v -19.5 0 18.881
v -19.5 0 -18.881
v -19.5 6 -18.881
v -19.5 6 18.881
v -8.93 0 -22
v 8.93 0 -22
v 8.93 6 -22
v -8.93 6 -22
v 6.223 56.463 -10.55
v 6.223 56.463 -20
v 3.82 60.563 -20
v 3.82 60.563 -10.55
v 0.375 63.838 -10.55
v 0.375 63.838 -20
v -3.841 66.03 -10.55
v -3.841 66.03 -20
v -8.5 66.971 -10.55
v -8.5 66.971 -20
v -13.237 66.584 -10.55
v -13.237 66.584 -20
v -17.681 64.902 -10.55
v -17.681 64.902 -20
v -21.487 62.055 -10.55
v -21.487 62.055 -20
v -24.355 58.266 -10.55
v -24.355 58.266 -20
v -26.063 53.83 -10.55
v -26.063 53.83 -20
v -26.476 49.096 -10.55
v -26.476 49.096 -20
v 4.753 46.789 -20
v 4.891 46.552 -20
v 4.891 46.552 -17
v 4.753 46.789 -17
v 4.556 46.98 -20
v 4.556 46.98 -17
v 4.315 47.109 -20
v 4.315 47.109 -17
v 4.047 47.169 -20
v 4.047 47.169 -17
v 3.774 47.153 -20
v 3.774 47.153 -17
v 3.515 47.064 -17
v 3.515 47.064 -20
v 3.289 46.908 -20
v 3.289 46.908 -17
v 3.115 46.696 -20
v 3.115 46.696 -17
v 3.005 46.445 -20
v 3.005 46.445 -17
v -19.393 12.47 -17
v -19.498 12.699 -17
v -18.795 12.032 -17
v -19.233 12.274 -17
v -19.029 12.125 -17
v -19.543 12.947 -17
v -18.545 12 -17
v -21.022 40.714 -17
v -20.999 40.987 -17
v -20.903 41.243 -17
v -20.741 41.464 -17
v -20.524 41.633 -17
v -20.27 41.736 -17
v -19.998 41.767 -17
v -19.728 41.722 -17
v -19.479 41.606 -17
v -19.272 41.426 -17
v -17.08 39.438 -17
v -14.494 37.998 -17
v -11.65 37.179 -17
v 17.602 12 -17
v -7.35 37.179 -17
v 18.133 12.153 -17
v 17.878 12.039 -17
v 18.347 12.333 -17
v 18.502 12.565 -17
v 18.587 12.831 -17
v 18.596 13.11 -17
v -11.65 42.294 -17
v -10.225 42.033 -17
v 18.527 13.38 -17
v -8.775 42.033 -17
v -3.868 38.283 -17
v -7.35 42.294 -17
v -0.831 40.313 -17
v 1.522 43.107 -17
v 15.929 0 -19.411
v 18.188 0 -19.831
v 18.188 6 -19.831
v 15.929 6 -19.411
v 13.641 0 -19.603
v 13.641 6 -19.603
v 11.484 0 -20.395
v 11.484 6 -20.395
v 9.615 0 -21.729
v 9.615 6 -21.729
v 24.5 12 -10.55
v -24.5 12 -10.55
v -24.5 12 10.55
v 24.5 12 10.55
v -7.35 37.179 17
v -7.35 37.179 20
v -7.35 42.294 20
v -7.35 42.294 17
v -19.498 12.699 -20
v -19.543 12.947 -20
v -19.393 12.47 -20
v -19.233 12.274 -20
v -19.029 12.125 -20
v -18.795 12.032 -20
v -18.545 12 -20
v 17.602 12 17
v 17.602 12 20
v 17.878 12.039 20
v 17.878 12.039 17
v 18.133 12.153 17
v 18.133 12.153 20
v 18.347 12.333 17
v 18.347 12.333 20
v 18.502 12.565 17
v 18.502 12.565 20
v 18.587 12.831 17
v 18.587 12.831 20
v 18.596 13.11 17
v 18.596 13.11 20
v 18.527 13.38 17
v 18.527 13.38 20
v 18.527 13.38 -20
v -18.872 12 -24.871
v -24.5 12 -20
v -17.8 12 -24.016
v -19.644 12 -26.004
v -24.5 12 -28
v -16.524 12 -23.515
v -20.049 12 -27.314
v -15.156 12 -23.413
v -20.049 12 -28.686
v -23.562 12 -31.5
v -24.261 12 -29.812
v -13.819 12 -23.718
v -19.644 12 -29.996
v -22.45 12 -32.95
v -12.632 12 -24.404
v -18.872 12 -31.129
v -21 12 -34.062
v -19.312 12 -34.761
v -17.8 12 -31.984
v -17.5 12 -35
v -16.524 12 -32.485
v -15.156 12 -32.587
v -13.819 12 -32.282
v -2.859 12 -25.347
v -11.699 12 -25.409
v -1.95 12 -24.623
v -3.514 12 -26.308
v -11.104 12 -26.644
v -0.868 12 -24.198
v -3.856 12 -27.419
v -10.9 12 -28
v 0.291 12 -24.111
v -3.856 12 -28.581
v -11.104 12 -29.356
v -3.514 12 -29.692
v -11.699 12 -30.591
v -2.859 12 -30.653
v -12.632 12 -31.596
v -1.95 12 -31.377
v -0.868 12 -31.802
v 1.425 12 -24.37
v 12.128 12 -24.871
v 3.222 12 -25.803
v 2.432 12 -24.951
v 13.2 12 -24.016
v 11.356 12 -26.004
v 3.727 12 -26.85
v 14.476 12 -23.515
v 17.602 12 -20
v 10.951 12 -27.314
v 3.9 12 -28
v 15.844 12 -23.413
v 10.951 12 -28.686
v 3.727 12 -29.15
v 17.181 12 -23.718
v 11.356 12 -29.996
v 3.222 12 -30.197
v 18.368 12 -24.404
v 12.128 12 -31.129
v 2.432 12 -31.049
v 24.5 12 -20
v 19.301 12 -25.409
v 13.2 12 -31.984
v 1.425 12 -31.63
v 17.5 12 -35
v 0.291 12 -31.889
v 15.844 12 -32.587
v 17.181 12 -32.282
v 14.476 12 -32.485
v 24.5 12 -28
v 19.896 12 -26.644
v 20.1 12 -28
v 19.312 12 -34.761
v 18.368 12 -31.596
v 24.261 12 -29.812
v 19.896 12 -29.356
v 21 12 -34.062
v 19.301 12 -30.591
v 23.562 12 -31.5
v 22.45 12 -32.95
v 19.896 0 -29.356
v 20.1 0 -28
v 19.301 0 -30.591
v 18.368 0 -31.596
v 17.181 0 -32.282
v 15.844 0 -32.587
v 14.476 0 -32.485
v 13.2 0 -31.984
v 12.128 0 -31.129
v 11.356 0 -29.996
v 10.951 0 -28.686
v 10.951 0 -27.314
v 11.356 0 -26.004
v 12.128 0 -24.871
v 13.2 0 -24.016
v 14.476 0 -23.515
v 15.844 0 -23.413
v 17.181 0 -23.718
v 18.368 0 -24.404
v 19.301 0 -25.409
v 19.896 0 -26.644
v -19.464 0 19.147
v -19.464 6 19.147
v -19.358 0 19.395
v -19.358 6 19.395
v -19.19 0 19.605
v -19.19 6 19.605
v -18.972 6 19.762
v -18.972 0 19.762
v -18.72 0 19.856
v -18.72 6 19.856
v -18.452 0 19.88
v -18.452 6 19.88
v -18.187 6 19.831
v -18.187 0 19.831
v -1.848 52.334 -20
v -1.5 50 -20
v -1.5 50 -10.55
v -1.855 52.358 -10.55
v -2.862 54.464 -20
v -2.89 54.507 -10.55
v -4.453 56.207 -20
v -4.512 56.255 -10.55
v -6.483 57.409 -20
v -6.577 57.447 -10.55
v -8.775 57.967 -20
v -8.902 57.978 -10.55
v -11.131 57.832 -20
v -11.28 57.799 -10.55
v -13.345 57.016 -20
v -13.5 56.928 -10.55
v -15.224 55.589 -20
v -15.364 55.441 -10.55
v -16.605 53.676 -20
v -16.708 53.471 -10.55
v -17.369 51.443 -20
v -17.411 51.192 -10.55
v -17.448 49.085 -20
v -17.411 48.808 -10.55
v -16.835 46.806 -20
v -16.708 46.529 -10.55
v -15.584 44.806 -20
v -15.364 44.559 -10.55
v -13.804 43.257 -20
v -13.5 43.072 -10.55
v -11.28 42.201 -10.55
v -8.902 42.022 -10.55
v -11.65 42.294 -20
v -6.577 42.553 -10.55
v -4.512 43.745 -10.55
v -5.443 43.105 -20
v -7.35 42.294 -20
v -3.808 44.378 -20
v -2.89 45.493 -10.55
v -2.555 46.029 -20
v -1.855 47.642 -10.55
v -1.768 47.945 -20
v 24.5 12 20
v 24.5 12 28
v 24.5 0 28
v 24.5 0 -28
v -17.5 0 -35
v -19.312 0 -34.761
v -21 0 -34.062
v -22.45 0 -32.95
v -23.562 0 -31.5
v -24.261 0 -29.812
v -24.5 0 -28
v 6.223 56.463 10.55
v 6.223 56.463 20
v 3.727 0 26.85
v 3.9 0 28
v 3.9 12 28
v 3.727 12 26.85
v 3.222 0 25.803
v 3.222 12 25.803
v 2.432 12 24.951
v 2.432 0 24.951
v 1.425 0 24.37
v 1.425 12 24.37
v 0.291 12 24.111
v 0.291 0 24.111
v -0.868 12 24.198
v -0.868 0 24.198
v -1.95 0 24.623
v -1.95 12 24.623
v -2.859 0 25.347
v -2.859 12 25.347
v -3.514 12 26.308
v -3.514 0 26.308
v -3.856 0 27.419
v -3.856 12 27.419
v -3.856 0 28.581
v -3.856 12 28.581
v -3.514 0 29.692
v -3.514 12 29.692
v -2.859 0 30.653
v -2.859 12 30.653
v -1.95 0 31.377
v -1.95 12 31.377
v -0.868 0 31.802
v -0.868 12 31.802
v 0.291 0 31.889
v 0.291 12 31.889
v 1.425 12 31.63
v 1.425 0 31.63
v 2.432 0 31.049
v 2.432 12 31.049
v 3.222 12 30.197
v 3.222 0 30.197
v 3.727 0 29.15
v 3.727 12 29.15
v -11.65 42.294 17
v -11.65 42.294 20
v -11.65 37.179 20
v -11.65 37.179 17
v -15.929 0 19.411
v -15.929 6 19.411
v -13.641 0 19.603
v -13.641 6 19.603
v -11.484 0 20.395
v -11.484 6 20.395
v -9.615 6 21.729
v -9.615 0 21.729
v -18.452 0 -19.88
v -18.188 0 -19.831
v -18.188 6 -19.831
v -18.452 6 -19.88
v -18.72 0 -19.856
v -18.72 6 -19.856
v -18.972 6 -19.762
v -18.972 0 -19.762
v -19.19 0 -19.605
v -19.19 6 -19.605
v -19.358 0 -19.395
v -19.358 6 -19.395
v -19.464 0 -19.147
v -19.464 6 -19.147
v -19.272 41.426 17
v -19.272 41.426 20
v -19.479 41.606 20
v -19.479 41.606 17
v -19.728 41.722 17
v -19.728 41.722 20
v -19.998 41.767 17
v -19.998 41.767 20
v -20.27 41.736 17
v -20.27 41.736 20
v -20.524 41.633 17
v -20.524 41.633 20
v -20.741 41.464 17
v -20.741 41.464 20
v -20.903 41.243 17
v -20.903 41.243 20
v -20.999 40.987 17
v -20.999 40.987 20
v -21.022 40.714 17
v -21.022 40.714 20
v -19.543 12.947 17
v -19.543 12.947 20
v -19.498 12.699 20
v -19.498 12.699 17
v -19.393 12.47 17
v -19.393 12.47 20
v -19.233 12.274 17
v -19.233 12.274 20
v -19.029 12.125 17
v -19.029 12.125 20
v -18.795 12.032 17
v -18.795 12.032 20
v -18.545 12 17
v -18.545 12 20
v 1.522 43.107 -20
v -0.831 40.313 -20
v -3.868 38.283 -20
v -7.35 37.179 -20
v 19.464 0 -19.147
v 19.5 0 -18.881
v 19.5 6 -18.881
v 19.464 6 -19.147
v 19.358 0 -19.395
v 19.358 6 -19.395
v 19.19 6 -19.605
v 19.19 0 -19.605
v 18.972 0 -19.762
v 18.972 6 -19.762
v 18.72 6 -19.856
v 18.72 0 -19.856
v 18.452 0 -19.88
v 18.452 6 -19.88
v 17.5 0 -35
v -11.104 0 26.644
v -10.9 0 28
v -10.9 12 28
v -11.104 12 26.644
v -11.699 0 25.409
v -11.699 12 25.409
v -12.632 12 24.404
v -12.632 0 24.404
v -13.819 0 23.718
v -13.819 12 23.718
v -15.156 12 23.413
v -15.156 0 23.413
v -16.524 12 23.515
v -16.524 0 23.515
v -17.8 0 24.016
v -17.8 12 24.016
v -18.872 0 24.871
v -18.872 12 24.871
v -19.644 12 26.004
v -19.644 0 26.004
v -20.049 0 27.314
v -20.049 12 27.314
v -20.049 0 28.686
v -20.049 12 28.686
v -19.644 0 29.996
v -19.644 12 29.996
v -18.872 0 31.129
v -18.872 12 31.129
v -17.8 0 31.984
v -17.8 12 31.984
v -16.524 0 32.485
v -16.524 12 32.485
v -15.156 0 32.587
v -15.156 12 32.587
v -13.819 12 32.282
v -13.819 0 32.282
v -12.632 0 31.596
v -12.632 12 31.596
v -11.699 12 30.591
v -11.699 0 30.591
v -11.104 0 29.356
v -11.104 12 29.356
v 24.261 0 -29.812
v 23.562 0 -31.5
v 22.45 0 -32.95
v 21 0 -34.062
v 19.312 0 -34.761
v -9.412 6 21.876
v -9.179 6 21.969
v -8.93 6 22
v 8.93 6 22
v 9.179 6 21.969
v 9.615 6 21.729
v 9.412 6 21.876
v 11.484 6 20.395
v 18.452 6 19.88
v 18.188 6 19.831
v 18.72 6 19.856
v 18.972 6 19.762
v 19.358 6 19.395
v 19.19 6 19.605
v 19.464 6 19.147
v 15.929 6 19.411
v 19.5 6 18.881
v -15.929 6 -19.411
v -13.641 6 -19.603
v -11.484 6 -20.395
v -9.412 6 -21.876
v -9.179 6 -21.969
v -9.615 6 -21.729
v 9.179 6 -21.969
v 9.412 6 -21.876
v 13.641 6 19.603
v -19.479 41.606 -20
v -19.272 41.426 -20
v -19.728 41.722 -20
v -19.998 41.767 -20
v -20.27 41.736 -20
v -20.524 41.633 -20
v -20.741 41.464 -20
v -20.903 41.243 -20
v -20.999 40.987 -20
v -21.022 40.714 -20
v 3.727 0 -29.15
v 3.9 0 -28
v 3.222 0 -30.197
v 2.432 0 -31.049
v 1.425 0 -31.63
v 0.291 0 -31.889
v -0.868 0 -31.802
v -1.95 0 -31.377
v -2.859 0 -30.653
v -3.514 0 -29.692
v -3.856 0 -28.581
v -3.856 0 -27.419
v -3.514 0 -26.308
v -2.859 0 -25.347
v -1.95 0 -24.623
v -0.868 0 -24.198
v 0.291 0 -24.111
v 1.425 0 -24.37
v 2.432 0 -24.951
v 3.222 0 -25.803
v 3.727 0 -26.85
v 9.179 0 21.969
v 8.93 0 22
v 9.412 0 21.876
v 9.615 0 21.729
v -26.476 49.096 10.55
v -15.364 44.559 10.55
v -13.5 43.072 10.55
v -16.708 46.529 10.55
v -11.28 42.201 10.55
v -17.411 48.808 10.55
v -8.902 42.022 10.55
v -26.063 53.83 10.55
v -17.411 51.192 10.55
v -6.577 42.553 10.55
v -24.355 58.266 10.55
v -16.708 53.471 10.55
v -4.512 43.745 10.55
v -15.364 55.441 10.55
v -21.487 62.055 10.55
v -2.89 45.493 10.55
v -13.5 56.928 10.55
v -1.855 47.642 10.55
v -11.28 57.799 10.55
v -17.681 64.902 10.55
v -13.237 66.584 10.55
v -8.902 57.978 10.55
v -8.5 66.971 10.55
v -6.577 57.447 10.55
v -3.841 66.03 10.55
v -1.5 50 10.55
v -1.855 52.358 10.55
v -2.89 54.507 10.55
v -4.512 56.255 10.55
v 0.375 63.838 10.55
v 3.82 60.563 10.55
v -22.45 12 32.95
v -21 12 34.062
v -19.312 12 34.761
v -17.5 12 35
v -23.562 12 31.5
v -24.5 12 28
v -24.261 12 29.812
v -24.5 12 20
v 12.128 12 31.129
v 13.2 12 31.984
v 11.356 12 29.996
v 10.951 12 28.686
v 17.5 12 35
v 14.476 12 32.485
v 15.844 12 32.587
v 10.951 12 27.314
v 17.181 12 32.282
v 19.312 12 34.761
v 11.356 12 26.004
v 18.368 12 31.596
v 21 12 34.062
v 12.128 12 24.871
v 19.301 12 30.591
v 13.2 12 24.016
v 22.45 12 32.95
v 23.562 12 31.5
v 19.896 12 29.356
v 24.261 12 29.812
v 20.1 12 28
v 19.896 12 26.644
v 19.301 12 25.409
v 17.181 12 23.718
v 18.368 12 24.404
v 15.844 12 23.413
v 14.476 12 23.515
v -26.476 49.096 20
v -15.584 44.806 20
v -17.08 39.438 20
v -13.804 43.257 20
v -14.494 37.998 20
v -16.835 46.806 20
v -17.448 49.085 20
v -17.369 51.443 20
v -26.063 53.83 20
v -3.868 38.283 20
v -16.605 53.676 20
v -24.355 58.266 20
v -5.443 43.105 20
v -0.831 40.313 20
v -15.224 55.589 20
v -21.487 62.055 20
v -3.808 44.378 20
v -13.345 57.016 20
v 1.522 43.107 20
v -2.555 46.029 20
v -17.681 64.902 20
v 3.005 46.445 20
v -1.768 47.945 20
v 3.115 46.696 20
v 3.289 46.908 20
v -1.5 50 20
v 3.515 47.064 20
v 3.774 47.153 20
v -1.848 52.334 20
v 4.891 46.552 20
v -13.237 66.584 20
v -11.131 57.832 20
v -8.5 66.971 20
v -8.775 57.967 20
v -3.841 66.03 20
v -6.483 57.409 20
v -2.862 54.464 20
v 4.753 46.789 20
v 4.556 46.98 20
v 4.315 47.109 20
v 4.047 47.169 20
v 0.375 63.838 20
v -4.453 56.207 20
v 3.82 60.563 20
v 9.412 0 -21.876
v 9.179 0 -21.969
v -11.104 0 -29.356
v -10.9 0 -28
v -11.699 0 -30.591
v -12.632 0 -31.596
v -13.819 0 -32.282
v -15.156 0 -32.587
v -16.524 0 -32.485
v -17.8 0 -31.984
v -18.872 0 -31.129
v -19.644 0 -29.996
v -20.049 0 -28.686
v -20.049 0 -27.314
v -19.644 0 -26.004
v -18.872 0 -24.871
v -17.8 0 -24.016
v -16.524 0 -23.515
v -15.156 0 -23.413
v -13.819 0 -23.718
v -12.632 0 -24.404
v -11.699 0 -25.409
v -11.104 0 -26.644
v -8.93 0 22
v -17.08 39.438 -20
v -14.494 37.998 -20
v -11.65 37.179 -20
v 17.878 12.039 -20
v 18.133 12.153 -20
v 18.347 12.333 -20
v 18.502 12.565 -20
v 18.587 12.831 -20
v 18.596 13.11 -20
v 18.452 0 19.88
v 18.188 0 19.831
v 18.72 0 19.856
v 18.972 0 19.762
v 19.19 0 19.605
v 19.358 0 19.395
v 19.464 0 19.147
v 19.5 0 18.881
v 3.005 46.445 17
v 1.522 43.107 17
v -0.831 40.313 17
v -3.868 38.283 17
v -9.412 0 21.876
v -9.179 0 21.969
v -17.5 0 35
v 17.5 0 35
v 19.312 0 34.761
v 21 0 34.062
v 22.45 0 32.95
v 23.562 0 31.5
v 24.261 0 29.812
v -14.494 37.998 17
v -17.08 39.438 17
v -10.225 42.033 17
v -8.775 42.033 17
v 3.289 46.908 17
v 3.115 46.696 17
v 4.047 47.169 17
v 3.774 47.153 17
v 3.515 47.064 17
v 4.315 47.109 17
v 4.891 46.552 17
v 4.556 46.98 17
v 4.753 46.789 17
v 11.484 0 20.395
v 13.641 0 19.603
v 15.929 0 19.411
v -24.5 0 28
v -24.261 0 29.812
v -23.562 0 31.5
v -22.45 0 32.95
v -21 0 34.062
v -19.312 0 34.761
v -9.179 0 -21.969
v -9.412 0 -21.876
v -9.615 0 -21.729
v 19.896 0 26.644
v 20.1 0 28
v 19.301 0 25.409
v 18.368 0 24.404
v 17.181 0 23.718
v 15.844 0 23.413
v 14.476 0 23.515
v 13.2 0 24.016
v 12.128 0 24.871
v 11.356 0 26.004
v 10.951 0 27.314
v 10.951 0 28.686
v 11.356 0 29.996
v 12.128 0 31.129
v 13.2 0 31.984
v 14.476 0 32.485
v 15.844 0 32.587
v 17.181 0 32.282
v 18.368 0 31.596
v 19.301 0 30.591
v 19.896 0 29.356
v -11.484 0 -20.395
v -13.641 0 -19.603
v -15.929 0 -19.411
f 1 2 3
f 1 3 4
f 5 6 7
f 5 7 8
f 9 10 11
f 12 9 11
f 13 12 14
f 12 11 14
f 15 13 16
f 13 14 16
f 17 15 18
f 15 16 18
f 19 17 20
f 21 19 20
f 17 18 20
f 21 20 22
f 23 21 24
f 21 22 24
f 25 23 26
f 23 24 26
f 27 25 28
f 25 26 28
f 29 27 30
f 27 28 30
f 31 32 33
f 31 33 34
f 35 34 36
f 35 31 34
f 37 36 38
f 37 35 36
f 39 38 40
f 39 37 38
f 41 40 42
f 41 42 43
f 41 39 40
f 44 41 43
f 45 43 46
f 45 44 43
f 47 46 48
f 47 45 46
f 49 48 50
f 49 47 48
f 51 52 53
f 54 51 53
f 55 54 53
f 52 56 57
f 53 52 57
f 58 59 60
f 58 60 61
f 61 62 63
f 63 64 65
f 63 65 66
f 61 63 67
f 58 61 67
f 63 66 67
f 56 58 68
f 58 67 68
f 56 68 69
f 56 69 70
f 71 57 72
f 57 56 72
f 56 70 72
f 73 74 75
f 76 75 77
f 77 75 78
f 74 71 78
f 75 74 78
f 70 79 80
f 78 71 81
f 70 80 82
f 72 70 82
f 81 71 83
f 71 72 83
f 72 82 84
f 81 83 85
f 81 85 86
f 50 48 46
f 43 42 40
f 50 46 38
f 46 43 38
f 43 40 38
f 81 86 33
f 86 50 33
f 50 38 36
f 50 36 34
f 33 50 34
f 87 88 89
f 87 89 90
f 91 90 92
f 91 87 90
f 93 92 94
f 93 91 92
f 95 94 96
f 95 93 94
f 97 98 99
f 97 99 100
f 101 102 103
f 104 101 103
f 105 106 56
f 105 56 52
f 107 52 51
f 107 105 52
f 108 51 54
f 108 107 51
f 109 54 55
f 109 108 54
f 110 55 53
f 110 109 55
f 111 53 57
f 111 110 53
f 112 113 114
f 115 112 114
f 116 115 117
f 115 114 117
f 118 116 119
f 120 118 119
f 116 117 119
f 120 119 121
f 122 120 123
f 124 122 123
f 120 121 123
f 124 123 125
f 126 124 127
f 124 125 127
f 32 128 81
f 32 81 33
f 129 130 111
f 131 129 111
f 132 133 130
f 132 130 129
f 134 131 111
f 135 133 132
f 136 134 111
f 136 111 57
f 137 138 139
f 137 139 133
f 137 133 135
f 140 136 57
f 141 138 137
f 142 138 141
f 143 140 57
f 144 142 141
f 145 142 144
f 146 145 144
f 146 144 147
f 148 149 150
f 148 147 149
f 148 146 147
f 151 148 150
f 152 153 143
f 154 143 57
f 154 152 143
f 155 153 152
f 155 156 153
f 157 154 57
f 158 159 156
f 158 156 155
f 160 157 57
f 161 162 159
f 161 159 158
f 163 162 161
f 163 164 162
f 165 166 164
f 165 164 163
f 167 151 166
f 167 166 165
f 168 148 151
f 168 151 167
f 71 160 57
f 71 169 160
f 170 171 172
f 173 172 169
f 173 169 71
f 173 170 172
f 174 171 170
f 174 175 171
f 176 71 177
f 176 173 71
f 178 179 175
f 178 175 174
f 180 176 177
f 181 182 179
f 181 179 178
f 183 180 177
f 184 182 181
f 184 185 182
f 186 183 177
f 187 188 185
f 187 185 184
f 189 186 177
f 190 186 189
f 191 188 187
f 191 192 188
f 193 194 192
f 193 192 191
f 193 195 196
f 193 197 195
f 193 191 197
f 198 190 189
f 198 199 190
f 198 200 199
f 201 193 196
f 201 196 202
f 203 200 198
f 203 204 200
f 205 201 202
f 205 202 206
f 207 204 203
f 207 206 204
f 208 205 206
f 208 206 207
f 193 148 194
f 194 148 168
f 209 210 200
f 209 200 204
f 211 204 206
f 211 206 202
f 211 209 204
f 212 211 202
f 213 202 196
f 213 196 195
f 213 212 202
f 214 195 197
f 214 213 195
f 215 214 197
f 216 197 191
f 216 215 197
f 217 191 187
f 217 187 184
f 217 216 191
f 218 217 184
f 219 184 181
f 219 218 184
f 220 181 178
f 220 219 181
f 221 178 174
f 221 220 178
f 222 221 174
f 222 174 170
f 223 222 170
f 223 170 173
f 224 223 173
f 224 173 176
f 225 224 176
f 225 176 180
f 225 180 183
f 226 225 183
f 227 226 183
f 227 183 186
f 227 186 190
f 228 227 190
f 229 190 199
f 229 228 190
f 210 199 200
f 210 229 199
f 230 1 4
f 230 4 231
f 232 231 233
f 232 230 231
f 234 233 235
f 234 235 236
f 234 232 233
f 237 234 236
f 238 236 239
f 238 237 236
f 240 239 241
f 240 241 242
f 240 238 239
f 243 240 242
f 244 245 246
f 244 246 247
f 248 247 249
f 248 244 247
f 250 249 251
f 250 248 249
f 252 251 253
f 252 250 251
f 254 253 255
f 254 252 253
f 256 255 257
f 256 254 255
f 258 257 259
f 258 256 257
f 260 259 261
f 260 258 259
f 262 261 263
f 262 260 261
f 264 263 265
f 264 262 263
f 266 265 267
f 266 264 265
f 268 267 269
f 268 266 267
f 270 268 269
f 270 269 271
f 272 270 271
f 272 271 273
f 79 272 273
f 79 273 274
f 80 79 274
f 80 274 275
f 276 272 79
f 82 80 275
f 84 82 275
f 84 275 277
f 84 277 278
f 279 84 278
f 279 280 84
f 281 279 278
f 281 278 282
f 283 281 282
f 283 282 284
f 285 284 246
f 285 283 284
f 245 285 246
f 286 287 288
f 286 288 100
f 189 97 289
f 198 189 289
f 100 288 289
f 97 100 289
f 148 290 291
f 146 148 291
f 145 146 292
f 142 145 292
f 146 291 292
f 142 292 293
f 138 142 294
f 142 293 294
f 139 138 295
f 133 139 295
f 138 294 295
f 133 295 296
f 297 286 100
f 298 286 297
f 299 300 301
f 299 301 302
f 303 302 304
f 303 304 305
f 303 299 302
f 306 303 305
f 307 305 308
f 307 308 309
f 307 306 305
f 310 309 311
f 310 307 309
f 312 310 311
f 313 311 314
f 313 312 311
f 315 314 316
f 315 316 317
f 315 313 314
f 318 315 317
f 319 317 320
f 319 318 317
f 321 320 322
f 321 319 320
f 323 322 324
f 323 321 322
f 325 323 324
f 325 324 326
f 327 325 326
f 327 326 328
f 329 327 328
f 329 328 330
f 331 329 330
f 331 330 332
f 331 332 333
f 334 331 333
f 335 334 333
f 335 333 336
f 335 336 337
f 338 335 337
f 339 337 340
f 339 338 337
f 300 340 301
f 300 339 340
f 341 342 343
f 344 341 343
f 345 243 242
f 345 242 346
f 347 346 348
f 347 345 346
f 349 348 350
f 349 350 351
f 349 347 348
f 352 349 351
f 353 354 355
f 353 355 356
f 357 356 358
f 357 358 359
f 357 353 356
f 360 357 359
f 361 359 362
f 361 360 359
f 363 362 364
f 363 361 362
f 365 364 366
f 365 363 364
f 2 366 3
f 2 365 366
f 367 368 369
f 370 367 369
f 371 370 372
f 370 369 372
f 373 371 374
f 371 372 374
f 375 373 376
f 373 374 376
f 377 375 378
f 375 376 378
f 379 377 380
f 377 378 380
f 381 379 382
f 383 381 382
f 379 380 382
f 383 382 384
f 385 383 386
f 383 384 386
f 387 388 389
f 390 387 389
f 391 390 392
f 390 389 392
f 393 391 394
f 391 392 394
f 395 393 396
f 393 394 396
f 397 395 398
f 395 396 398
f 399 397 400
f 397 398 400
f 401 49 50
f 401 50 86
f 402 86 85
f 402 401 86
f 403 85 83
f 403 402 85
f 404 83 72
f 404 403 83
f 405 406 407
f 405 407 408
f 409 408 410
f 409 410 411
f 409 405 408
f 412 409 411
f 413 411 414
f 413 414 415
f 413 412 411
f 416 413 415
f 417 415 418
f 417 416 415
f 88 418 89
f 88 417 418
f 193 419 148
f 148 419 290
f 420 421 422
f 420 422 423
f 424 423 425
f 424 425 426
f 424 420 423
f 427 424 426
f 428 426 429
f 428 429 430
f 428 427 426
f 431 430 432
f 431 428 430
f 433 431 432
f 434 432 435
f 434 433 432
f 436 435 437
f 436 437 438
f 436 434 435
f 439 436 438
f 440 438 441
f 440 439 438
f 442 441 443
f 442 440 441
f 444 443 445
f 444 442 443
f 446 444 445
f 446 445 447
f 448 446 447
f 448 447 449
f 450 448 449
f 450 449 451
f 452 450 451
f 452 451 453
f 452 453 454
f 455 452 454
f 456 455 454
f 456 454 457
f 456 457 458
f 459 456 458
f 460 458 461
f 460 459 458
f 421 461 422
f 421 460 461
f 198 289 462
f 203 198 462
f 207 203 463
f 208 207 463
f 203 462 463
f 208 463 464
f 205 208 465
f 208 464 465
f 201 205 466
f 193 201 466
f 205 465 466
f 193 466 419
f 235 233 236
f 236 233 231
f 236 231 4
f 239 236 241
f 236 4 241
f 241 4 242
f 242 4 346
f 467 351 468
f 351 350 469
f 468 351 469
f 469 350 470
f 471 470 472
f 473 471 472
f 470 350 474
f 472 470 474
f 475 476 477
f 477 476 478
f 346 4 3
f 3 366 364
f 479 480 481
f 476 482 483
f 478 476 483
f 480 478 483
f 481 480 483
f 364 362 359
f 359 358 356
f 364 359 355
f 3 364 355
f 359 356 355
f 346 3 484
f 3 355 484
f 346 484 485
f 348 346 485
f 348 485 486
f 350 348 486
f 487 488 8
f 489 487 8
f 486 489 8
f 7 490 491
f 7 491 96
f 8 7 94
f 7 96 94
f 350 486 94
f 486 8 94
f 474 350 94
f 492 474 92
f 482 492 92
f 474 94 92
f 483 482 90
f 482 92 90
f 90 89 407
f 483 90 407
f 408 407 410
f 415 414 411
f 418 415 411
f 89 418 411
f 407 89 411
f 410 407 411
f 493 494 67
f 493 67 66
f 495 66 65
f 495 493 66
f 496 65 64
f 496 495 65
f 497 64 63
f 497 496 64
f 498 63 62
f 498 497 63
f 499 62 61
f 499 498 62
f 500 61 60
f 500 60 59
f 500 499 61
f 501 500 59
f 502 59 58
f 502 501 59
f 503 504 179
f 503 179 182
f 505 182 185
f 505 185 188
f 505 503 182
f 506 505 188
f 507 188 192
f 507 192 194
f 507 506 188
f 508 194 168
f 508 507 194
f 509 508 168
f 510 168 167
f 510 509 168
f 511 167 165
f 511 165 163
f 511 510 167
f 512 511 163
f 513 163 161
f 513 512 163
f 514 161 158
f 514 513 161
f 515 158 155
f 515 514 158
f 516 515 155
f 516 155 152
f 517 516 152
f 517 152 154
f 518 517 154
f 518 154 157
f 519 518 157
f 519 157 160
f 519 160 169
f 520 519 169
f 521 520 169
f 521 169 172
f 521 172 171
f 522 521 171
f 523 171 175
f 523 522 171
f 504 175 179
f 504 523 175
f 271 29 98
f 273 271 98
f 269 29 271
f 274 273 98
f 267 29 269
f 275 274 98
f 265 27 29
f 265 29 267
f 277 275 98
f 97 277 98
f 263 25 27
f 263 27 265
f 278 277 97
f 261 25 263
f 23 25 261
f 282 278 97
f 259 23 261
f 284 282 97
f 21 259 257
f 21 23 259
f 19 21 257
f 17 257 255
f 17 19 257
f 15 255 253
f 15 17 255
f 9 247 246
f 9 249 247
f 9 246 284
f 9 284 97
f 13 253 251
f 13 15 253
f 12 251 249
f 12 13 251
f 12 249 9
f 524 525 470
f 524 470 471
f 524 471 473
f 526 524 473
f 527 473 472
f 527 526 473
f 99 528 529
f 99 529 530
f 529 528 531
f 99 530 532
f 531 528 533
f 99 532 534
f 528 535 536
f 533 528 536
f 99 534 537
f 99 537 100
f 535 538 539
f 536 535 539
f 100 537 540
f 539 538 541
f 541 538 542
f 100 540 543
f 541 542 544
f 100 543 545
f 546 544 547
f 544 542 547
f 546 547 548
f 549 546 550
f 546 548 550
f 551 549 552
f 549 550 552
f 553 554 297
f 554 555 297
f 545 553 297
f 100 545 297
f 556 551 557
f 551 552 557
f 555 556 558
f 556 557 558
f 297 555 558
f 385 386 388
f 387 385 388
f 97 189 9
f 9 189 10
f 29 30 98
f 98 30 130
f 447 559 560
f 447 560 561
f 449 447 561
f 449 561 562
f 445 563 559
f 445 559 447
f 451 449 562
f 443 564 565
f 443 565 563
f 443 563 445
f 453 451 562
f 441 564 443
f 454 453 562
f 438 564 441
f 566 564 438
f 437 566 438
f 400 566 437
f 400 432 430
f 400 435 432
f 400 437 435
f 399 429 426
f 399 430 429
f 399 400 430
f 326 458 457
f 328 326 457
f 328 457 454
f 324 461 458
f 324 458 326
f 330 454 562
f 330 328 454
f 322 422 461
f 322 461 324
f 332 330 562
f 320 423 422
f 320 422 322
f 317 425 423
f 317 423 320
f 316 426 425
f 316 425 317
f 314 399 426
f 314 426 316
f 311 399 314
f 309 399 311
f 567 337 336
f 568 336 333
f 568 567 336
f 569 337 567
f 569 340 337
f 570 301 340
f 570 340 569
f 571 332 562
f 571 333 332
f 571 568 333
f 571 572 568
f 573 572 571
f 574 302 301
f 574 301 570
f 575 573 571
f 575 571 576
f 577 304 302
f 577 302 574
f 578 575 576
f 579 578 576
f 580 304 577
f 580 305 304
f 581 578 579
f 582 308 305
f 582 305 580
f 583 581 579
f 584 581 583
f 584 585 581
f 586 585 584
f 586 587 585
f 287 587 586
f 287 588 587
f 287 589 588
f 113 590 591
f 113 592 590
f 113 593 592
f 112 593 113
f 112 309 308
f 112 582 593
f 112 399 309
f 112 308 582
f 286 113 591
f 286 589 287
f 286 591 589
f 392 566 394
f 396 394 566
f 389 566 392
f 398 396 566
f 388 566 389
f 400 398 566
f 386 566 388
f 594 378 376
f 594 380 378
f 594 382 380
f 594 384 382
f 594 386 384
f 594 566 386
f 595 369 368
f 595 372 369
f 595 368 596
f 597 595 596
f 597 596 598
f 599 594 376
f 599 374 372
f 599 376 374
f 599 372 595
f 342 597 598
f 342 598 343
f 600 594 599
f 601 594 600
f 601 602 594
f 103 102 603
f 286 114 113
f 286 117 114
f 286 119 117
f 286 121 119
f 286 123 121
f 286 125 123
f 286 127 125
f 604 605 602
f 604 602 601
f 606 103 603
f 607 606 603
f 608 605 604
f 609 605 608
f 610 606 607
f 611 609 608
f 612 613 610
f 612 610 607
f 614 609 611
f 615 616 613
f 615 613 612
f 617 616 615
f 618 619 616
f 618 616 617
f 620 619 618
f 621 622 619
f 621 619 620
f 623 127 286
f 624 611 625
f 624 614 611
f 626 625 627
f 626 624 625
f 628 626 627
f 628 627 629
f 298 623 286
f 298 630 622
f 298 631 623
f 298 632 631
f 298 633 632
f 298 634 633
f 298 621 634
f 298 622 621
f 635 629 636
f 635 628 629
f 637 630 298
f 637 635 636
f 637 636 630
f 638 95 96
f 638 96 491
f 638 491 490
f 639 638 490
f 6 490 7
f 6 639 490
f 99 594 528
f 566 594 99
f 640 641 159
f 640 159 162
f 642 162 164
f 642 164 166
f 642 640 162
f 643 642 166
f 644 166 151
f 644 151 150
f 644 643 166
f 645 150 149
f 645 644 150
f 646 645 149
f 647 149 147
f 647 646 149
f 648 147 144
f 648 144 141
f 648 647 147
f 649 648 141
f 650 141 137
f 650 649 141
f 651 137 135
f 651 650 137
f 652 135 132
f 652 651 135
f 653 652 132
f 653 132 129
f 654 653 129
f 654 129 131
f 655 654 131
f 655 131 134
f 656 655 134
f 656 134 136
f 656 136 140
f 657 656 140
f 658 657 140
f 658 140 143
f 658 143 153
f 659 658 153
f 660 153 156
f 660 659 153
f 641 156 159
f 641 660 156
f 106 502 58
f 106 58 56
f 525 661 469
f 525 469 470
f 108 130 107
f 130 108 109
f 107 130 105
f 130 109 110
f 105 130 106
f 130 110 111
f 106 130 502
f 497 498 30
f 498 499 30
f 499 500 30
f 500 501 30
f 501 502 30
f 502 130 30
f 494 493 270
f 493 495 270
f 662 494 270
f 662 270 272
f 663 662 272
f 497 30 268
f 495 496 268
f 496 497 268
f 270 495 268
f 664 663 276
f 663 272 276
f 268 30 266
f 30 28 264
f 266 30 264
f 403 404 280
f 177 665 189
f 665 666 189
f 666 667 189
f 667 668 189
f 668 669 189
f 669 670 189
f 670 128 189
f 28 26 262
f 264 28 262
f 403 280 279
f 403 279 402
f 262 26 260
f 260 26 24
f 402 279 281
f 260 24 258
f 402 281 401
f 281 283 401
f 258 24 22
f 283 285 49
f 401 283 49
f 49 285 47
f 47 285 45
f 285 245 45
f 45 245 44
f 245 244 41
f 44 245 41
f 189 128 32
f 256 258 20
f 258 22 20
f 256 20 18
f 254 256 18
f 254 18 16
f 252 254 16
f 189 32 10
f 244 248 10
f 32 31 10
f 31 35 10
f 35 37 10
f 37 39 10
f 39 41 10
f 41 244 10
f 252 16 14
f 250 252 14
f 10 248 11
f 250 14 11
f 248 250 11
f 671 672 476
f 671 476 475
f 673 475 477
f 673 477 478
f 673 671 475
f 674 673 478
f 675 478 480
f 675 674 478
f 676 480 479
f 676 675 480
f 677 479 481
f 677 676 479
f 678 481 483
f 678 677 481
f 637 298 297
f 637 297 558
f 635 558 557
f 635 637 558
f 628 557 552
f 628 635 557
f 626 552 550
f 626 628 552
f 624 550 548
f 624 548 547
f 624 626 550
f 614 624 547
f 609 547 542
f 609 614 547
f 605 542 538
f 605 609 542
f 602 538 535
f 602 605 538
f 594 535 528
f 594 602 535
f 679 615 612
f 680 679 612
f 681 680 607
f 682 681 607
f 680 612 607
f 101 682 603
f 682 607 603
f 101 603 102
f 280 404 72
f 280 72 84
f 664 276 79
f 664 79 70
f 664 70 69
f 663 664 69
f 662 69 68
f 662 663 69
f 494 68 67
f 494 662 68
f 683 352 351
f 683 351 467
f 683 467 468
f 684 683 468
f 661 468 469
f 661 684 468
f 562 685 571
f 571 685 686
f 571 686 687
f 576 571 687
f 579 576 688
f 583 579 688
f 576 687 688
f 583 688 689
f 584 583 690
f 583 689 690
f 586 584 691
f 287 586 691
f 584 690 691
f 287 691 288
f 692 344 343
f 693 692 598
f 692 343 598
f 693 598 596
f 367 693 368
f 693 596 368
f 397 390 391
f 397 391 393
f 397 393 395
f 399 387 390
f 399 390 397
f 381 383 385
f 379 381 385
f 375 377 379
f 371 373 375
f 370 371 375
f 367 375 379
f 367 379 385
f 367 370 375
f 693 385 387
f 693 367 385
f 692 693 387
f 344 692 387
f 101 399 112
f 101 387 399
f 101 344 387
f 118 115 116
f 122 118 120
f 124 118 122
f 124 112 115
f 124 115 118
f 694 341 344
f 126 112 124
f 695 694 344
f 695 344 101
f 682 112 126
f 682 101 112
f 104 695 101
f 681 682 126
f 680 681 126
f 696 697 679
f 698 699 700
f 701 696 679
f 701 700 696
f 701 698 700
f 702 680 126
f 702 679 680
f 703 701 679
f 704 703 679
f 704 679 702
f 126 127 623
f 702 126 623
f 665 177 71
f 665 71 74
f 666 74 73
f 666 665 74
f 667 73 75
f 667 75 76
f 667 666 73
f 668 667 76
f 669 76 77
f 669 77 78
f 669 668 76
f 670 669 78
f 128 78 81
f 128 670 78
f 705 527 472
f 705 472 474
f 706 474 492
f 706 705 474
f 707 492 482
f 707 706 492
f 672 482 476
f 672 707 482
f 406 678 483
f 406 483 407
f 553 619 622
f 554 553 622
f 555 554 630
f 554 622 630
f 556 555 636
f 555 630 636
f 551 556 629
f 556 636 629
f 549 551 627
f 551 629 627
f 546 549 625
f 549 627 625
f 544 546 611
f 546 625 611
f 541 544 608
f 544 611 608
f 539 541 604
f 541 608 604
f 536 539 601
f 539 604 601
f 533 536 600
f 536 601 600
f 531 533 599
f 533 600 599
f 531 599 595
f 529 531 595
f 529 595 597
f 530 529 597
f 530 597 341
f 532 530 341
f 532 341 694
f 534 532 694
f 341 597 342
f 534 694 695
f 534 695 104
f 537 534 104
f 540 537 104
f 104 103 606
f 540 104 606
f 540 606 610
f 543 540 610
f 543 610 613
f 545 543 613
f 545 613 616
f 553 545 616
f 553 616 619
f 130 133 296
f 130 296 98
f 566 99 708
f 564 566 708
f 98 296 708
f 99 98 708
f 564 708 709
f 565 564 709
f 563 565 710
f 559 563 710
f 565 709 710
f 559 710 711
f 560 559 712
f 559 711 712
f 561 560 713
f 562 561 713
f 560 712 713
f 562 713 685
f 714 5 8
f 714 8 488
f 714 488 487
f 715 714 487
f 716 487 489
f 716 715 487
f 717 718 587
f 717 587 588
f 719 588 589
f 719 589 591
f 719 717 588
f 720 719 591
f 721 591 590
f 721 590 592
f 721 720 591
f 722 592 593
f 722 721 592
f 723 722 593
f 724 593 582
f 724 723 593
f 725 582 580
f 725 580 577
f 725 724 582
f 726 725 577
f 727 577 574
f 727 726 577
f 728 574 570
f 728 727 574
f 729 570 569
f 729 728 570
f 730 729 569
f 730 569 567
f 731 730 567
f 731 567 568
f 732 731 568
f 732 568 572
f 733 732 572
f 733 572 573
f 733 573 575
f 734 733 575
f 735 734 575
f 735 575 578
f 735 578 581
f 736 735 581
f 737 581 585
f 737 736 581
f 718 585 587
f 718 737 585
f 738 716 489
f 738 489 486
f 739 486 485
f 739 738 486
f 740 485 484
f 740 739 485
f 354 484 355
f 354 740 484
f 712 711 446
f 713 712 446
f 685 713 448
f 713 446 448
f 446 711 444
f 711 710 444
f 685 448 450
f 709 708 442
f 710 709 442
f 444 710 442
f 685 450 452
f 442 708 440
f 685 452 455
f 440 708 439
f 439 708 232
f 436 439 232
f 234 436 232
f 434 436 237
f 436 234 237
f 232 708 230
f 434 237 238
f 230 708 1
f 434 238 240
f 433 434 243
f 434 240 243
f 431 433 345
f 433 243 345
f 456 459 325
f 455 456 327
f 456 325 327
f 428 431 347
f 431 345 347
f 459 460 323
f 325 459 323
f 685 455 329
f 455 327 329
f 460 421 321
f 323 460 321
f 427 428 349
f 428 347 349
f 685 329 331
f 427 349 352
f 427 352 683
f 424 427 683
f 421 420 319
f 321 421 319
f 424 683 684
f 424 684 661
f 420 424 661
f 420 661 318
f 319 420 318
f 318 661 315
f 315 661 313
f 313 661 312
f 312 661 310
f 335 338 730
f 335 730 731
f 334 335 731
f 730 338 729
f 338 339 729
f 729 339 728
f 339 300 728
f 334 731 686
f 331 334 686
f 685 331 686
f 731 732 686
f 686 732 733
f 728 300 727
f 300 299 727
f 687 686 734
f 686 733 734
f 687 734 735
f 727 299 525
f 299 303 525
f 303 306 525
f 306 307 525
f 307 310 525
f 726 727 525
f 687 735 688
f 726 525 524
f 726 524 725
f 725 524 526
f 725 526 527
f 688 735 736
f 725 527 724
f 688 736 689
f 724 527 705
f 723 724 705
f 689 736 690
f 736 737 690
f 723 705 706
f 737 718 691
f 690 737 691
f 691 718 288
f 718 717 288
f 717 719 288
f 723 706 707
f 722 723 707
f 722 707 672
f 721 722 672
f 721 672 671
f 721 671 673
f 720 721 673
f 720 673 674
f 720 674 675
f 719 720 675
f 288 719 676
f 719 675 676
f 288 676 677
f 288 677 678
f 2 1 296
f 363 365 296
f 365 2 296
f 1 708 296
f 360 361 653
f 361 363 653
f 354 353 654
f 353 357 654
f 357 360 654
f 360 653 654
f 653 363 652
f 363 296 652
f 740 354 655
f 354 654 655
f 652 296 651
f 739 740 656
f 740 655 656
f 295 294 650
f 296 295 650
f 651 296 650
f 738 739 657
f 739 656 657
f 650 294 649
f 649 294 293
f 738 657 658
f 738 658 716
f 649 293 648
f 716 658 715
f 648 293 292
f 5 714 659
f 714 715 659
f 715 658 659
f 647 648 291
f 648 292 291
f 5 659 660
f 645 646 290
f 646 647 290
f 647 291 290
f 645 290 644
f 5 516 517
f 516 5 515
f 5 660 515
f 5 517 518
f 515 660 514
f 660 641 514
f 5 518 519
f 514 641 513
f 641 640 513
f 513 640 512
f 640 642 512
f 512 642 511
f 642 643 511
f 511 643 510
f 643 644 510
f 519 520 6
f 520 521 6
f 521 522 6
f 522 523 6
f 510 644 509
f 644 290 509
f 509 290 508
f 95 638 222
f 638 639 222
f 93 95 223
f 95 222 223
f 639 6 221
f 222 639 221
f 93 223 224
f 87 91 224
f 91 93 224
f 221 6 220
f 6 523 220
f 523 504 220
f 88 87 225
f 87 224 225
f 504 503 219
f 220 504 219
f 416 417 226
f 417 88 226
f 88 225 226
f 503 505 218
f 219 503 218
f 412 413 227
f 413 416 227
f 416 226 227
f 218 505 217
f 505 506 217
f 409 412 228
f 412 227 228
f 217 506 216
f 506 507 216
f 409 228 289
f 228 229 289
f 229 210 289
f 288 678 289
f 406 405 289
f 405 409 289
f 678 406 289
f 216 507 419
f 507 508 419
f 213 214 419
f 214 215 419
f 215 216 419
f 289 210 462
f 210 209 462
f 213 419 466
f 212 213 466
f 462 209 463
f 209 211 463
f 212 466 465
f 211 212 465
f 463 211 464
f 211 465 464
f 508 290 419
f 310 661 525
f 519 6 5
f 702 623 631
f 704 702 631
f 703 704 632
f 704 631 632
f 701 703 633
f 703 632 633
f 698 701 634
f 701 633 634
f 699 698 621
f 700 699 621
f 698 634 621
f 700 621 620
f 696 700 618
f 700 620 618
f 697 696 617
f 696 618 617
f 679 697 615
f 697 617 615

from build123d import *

# Parameters (mm, degrees)
SKETCH1_R               = 4.6
SKETCH1_R_2             = 3.9
BOSS_EXTRUDE1_DEPTH     = 12
CUT_EXTRUDE1_DEPTH      = 6
SKETCH3_R               = 8
BOSS_EXTRUDE2_DEPTH     = 9.45
CUT_EXTRUDE2_DEPTH      = 3
SKETCH5_R               = 8
BOSS_EXTRUDE3_DEPTH     = 9.45
CUT_EXTRUDE3_DEPTH      = 3
CUT_EXTRUDE4_DEPTH      = 3
CUT_EXTRUDE4_DEPTH_BACK = 3
CUT_EXTRUDE5_DEPTH      = 3
CUT_EXTRUDE5_DEPTH_BACK = 3


with BuildPart() as part:
    # Sketch1 → Boss-Extrude1 (new body)
    with BuildSketch(Plane(origin=(0, 0, 0), x_dir=(1, 0, 0), z_dir=(0, 1, 0))):
        with BuildLine():
            Line((-17.5, -35), (17.5, -35))
            ThreePointArc((17.5, -35), (22.449747468, -32.949747468), (24.5, -28))
            Line((24.5, -28), (24.5, 28))
            ThreePointArc((24.5, 28), (22.449747468, 32.949747468), (17.5, 35))
            Line((17.5, 35), (-17.5, 35))
            ThreePointArc((-17.5, 35), (-22.449747468, 32.949747468), (-24.5, 28))
            Line((-24.5, 28), (-24.5, -28))
            ThreePointArc((-24.5, -28), (-22.449747468, -32.949747468), (-17.5, -35))
        make_face()
        with Locations((15.5, 28)):
            Circle(SKETCH1_R, mode=Mode.SUBTRACT)
        with Locations((15.5, -28)):
            Circle(SKETCH1_R, mode=Mode.SUBTRACT)
        with Locations((0, 28)):
            Circle(SKETCH1_R_2, mode=Mode.SUBTRACT)
        with Locations((0, -28)):
            Circle(SKETCH1_R_2, mode=Mode.SUBTRACT)
        with Locations((-15.5, 28)):
            Circle(SKETCH1_R, mode=Mode.SUBTRACT)
        with Locations((-15.5, -28)):
            Circle(SKETCH1_R, mode=Mode.SUBTRACT)
    extrude(amount=BOSS_EXTRUDE1_DEPTH)

    # Sketch2 → Cut-Extrude1 (cut)
    with BuildSketch(Plane(origin=(0, 0, 0), x_dir=(1, 0, 0), z_dir=(0, 1, 0))):
        with BuildLine():
            Line((-8.930372918, -22), (8.930372918, -22))
            ThreePointArc((8.930372918, -22), (9.298362954, -21.929829734), (9.614709072, -21.729166667))
            ThreePointArc((9.614709072, -21.729166667), (13.6405636, -19.603423539), (18.1875, -19.830707267))
            ThreePointArc((18.1875, -19.830707267), (19.08630197, -19.690882095), (19.5, -18.880789508))
            Line((19.5, -18.880789508), (19.5, 18.880789508))
            ThreePointArc((19.5, 18.880789508), (19.08630197, 19.690882095), (18.1875, 19.830707267))
            ThreePointArc((18.1875, 19.830707267), (13.6405636, 19.603423539), (9.614709072, 21.729166667))
            ThreePointArc((9.614709072, 21.729166667), (9.298362954, 21.929829734), (8.930372918, 22))
            Line((8.930372918, 22), (-8.930372918, 22))
            ThreePointArc((-8.930372918, 22), (-9.298362954, 21.929829734), (-9.614709072, 21.729166667))
            ThreePointArc((-9.614709072, 21.729166667), (-13.6405636, 19.603423539), (-18.1875, 19.830707267))
            ThreePointArc((-18.1875, 19.830707267), (-19.08630197, 19.690882095), (-19.5, 18.880789508))
            Line((-19.5, 18.880789508), (-19.5, -18.880789508))
            ThreePointArc((-19.5, -18.880789508), (-19.086301938, -19.690882118), (-18.187499925, -19.830707243))
            ThreePointArc((-18.187499925, -19.830707243), (-13.640563561, -19.603423547), (-9.614709072, -21.729166667))
            ThreePointArc((-9.614709072, -21.729166667), (-9.298362954, -21.929829734), (-8.930372918, -22))
        make_face()
    extrude(amount=CUT_EXTRUDE1_DEPTH, mode=Mode.SUBTRACT)

    # Sketch3 → Boss-Extrude2 (add)
    with BuildSketch(Plane.XY.offset(20)):
        with BuildLine():
            Line((-26.475934633, 49.095763671), (-24.5, 12))
            Line((-24.5, 12), (24.5, 12))
            Line((24.5, 12), (6.223487863, 56.463120719))
            ThreePointArc((6.223487863, 56.463120719), (-13.236528228, 66.584280413), (-26.475934633, 49.095763671))
        make_face()
        with Locations((-9.5, 50)):
            Circle(SKETCH3_R, mode=Mode.SUBTRACT)
    extrude(amount=-BOSS_EXTRUDE2_DEPTH)

    # Sketch4 → Cut-Extrude2 (cut)
    with BuildSketch(Plane.XY.offset(20)):
        with BuildLine():
            Line((-21.022370546, 40.713721035), (-19.543344466, 12.946809628))
            ThreePointArc((-19.543344466, 12.946809628), (-19.232804271, 12.274331215), (-18.544760076, 12))
            Line((-18.544760076, 12), (17.60184091, 12))
            ThreePointArc((17.60184091, 12), (18.432558544, 12.443305996), (18.526751961, 13.380183572))
            Line((18.526751961, 13.380183572), (4.891418921, 46.552238199))
            ThreePointArc((4.891418921, 46.552238199), (3.910016369, 47.170457707), (3.004614451, 46.445479297))
            ThreePointArc((3.004614451, 46.445479297), (-6.642654885, 37.317903214), (-19.272087144, 41.426417736))
            ThreePointArc((-19.272087144, 41.426417736), (-20.400909801, 41.693074328), (-21.022370546, 40.713721035))
        make_face()
    extrude(amount=-CUT_EXTRUDE2_DEPTH, mode=Mode.SUBTRACT)

    # Sketch5 → Boss-Extrude3 (add)
    with BuildSketch(Plane.XY.offset(-20)):
        with BuildLine():
            Line((-26.475934633, 49.095763671), (-24.5, 12))
            Line((-24.5, 12), (24.5, 12))
            Line((24.5, 12), (6.223487863, 56.463120719))
            ThreePointArc((6.223487863, 56.463120719), (-13.236528228, 66.584280413), (-26.475934633, 49.095763671))
        make_face()
        with Locations((-9.5, 50)):
            Circle(SKETCH5_R, mode=Mode.SUBTRACT)
    extrude(amount=BOSS_EXTRUDE3_DEPTH)

    # Sketch6 → Cut-Extrude3 (cut)
    with BuildSketch(Plane.XY.offset(-20)):
        with BuildLine():
            Line((-21.022370546, 40.713721035), (-19.543344466, 12.946809628))
            ThreePointArc((-19.543344466, 12.946809628), (-19.232804271, 12.274331215), (-18.544760076, 12))
            Line((-18.544760076, 12), (17.60184091, 12))
            ThreePointArc((17.60184091, 12), (18.432558544, 12.443305996), (18.526751961, 13.380183572))
            Line((18.526751961, 13.380183572), (4.891418921, 46.552238199))
            ThreePointArc((4.891418921, 46.552238199), (3.910016369, 47.170457707), (3.004614451, 46.445479297))
            ThreePointArc((3.004614451, 46.445479297), (-6.642654885, 37.317903214), (-19.272087144, 41.426417736))
            ThreePointArc((-19.272087144, 41.426417736), (-20.400909801, 41.693074328), (-21.022370546, 40.713721035))
        make_face()
    extrude(amount=CUT_EXTRUDE3_DEPTH, mode=Mode.SUBTRACT)

    # Sketch7 → Cut-Extrude4 (cut, two sides)
    with BuildSketch(Plane.XY.offset(20)) as cut_extrude4_sk:
        with BuildLine():
            Line((-7.35, 35.15), (-7.35, 50))
            Line((-7.35, 50), (-11.65, 50))
            Line((-11.65, 50), (-11.65, 35.15))
            ThreePointArc((-11.65, 35.15), (-9.5, 33), (-7.35, 35.15))
        make_face()
    extrude(amount=CUT_EXTRUDE4_DEPTH, mode=Mode.SUBTRACT)
    extrude(cut_extrude4_sk.sketch, amount=-CUT_EXTRUDE4_DEPTH_BACK, mode=Mode.SUBTRACT)

    # Sketch8 → Cut-Extrude5 (cut, two sides)
    with BuildSketch(Plane.XY.offset(-20)) as cut_extrude5_sk:
        with BuildLine():
            Line((-7.35, 35.15), (-7.35, 50))
            Line((-7.35, 50), (-11.65, 50))
            Line((-11.65, 50), (-11.65, 35.15))
            ThreePointArc((-11.65, 35.15), (-9.5, 33), (-7.35, 35.15))
        make_face()
    extrude(amount=CUT_EXTRUDE5_DEPTH, mode=Mode.SUBTRACT)
    extrude(cut_extrude5_sk.sketch, amount=-CUT_EXTRUDE5_DEPTH_BACK, mode=Mode.SUBTRACT)


solid = part.part
